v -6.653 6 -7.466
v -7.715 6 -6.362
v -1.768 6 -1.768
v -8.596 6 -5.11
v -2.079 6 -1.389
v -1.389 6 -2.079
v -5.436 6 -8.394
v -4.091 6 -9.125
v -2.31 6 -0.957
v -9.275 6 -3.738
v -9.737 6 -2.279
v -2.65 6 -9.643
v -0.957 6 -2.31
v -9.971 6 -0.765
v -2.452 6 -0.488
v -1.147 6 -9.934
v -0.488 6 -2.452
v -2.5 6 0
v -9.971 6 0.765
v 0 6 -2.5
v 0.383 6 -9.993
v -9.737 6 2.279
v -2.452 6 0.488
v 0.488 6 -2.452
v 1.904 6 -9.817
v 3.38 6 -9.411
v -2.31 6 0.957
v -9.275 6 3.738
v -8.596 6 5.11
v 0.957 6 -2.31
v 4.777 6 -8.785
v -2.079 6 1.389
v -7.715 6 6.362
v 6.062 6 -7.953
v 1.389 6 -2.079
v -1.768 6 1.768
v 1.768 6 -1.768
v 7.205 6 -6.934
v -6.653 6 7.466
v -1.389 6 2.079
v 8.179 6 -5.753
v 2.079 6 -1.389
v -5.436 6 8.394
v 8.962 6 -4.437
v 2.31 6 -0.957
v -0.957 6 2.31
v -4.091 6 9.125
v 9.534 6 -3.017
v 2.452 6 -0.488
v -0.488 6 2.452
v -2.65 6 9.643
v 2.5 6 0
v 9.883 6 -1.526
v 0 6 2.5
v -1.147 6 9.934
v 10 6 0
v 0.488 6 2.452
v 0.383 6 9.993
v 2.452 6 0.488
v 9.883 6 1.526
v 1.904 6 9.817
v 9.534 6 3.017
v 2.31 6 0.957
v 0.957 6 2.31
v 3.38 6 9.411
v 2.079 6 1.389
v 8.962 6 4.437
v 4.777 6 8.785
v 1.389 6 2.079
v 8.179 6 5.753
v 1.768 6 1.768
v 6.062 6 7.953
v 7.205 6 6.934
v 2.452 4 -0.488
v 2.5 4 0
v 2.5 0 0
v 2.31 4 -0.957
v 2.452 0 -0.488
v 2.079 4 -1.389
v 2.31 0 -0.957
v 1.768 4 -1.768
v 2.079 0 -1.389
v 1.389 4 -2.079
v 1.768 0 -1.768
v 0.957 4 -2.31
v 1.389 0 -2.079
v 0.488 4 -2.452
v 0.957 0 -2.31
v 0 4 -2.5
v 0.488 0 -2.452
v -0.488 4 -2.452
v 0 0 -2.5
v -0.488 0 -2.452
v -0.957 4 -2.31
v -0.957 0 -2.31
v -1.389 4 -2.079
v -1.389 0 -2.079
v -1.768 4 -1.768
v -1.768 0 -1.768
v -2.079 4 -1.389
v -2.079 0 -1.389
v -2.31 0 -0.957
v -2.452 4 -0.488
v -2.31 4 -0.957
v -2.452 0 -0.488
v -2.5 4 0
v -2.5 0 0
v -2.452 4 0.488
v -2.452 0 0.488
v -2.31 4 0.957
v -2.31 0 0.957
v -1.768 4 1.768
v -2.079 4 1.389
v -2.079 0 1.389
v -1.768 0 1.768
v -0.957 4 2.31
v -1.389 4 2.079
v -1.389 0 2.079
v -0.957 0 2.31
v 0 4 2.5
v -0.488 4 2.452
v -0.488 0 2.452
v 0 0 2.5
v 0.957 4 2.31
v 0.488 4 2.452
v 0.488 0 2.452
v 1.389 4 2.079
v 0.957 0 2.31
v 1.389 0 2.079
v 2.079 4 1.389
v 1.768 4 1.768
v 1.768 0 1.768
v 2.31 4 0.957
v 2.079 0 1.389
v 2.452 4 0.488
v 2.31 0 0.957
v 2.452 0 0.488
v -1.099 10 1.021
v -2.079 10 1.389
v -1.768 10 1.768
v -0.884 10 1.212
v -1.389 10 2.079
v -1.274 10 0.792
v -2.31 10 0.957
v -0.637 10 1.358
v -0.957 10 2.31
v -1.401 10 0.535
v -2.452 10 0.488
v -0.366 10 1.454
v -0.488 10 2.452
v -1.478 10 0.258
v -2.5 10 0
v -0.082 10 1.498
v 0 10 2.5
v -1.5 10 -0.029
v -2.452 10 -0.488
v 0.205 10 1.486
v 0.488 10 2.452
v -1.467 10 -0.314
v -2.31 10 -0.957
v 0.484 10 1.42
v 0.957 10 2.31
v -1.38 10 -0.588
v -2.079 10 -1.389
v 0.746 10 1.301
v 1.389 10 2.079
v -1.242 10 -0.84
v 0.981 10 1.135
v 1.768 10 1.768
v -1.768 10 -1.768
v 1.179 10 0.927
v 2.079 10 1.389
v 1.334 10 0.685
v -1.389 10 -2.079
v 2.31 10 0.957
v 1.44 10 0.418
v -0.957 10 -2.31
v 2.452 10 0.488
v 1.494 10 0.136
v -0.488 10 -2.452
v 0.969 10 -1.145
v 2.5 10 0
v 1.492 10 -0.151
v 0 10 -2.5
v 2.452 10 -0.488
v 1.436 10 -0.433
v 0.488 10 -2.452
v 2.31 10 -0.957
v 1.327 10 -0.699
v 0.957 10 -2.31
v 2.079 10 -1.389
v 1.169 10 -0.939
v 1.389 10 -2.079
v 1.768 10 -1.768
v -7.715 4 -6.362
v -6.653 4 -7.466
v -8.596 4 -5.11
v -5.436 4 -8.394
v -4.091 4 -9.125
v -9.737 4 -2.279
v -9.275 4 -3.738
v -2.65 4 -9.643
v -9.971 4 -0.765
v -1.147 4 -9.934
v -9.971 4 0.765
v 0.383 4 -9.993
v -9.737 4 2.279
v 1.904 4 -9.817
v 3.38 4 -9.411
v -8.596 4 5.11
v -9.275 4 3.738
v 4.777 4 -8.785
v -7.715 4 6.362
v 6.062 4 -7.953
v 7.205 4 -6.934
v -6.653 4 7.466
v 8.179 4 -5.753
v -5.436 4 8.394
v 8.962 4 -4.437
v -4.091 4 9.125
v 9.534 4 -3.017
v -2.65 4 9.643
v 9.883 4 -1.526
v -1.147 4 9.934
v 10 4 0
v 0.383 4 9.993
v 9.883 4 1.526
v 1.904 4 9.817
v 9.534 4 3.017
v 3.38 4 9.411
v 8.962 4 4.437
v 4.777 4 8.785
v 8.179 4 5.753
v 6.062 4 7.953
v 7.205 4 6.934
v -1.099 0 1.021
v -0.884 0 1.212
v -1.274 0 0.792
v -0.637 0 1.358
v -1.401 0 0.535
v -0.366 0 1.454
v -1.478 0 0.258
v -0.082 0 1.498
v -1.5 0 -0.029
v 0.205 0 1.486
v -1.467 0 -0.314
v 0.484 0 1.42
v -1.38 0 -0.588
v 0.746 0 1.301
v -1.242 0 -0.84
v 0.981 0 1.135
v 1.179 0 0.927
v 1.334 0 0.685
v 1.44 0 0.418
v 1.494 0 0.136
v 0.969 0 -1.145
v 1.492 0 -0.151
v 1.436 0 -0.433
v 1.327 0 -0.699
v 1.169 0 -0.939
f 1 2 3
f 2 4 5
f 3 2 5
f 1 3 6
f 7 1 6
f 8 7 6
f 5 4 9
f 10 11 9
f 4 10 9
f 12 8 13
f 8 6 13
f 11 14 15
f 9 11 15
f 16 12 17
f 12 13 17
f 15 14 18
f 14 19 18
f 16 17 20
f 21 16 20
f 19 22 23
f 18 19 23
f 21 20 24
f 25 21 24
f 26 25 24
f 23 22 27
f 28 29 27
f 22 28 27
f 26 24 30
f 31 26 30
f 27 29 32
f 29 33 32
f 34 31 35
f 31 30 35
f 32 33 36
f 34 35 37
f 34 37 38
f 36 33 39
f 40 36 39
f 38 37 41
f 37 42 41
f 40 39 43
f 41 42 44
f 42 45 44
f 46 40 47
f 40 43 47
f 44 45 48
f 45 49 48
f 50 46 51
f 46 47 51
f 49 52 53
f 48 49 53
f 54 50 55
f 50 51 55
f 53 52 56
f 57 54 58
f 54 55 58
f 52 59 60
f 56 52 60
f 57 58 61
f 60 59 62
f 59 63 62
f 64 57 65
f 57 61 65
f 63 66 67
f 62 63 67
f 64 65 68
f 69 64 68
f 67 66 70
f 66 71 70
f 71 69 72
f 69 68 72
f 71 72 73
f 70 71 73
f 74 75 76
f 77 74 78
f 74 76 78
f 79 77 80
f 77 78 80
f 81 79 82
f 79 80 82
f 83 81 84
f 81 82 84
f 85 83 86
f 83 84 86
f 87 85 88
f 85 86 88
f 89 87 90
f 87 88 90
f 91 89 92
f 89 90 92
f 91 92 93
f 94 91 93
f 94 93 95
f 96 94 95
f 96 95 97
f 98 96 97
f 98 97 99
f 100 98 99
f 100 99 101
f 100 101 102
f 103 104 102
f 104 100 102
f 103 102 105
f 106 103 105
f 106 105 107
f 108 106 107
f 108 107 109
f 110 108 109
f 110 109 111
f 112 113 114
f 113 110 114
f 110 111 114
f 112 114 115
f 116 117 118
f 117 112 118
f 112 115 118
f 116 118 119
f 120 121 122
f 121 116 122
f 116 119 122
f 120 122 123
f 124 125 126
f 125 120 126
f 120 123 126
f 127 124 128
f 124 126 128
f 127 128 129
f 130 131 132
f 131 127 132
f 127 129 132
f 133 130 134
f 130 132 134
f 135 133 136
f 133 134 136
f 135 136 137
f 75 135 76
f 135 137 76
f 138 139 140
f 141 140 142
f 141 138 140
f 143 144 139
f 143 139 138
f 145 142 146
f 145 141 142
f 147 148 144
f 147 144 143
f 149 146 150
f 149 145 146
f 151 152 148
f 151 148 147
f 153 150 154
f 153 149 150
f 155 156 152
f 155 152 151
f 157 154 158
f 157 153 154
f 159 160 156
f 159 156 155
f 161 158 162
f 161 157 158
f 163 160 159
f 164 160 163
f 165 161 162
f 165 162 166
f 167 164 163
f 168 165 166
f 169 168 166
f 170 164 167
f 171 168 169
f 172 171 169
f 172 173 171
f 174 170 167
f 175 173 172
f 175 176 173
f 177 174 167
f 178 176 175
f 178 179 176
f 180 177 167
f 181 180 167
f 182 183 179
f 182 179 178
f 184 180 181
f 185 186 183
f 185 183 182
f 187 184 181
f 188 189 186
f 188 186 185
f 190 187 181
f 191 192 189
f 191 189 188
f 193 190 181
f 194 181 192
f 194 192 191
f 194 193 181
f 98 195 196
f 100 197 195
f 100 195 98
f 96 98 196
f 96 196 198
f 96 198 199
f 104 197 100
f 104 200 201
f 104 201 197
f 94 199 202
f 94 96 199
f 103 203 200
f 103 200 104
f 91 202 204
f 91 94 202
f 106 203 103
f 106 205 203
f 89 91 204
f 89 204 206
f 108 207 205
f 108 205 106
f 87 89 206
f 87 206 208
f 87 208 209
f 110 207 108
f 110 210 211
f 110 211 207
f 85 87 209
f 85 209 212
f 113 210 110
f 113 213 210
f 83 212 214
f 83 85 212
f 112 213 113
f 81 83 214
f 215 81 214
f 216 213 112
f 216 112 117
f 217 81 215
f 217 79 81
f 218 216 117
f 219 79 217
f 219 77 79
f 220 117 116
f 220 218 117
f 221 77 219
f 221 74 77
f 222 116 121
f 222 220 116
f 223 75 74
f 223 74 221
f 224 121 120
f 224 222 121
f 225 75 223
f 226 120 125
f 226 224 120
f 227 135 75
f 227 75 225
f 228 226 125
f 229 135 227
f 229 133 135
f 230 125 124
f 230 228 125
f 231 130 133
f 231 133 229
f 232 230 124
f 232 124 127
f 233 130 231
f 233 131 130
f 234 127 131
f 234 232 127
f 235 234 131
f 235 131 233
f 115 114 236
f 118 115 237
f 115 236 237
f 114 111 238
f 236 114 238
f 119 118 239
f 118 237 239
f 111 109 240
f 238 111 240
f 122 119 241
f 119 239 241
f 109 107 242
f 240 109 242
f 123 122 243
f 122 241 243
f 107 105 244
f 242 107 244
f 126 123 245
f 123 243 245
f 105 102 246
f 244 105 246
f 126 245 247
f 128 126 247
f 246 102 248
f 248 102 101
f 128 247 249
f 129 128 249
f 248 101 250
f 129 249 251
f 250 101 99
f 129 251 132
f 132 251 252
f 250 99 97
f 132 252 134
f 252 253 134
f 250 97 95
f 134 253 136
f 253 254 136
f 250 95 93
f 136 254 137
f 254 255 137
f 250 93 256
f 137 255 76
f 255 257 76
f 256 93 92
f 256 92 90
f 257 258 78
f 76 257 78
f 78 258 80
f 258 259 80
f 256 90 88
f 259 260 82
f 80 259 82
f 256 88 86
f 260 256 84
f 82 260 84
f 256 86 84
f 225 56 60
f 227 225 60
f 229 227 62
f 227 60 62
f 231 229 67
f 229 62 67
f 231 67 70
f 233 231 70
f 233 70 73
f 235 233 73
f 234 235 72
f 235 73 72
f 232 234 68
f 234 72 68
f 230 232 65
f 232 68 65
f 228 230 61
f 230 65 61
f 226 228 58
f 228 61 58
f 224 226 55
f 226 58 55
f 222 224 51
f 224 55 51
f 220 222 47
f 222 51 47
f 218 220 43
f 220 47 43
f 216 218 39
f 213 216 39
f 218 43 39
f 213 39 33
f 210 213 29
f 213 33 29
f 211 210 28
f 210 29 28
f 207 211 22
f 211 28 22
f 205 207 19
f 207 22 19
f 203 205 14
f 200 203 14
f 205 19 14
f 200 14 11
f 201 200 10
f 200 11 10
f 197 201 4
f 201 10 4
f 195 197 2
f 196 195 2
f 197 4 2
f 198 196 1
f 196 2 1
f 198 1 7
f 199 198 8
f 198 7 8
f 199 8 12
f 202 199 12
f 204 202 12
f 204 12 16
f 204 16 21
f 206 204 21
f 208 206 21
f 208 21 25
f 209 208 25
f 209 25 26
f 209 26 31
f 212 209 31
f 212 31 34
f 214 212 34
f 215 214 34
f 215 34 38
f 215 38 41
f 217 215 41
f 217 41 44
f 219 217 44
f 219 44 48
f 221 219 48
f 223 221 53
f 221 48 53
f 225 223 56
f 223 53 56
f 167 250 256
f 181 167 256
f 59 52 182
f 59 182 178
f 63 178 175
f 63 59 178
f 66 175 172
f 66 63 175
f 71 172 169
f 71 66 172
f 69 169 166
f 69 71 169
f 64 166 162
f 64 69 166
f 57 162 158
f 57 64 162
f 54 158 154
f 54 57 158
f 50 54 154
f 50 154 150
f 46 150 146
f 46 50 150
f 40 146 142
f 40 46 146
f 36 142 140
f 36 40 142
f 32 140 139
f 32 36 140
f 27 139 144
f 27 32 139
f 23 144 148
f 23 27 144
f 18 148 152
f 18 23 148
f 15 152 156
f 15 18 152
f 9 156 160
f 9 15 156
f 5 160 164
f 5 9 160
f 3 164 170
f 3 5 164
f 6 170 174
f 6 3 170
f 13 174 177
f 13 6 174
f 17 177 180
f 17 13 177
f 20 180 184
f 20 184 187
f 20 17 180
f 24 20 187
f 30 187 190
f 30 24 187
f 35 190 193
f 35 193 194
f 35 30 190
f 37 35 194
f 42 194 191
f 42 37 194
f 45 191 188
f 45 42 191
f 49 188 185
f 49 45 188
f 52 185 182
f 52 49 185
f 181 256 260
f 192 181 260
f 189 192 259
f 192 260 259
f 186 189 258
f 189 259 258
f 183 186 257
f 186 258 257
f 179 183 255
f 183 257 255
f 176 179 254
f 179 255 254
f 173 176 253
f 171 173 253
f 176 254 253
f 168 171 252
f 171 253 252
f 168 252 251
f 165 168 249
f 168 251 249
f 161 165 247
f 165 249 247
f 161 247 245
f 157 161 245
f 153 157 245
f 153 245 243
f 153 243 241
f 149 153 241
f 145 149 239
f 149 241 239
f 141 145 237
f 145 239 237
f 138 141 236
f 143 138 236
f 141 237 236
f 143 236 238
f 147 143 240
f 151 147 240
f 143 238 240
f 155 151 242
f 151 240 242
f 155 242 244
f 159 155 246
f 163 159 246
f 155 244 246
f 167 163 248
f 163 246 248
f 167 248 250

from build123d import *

# Parameters (mm, degrees)
SKETCH1_R           = 2.5
BOSS_EXTRUDE1_DEPTH = 10
SKETCH3_R           = 10
SKETCH3_R_2         = 2.5
BOSS_EXTRUDE2_DEPTH = 4
SKETCH4_R           = 10
SKETCH4_R_2         = 2.5
BOSS_EXTRUDE3_DEPTH = 2
SKETCH4_2_R         = 10
SKETCH4_2_R_2       = 2.5
CUT_EXTRUDE1_DEPTH  = 4


with BuildPart() as part:
    # Sketch1 → Boss-Extrude1 (new body)
    with BuildSketch(Plane(origin=(0, 0, 0), x_dir=(1, 0, 0), z_dir=(0, 1, 0))):
        Circle(SKETCH1_R)
        with BuildLine():
            Line((-1.242447099, 0.840431559), (0.968768208, 1.14513458))
            ThreePointArc((0.968768208, 1.14513458), (0.204756352, -1.485907091), (-1.242447099, 0.840431559))
        make_face(mode=Mode.SUBTRACT)
    extrude(amount=BOSS_EXTRUDE1_DEPTH)

    # Sketch3 → Boss-Extrude2 (add)
    with BuildSketch(Plane(origin=(0, 10, 0), x_dir=(1, 0, 0), z_dir=(0, 1, 0))):
        Circle(SKETCH3_R)
        Circle(SKETCH3_R_2, mode=Mode.SUBTRACT)
    extrude(amount=-BOSS_EXTRUDE2_DEPTH)

    # Sketch4 → Boss-Extrude3 (add)
    with BuildSketch(Plane.XZ.offset(-6)):
        Circle(SKETCH4_R)
        Circle(SKETCH4_R_2, mode=Mode.SUBTRACT)
    extrude(amount=BOSS_EXTRUDE3_DEPTH)

    # Sketch4<2> → Cut-Extrude1 (cut)
    with BuildSketch(Plane.XZ.offset(-6)):
        Circle(SKETCH4_2_R)
        Circle(SKETCH4_2_R_2, mode=Mode.SUBTRACT)
    extrude(amount=-CUT_EXTRUDE1_DEPTH, mode=Mode.SUBTRACT)


solid = part.part
